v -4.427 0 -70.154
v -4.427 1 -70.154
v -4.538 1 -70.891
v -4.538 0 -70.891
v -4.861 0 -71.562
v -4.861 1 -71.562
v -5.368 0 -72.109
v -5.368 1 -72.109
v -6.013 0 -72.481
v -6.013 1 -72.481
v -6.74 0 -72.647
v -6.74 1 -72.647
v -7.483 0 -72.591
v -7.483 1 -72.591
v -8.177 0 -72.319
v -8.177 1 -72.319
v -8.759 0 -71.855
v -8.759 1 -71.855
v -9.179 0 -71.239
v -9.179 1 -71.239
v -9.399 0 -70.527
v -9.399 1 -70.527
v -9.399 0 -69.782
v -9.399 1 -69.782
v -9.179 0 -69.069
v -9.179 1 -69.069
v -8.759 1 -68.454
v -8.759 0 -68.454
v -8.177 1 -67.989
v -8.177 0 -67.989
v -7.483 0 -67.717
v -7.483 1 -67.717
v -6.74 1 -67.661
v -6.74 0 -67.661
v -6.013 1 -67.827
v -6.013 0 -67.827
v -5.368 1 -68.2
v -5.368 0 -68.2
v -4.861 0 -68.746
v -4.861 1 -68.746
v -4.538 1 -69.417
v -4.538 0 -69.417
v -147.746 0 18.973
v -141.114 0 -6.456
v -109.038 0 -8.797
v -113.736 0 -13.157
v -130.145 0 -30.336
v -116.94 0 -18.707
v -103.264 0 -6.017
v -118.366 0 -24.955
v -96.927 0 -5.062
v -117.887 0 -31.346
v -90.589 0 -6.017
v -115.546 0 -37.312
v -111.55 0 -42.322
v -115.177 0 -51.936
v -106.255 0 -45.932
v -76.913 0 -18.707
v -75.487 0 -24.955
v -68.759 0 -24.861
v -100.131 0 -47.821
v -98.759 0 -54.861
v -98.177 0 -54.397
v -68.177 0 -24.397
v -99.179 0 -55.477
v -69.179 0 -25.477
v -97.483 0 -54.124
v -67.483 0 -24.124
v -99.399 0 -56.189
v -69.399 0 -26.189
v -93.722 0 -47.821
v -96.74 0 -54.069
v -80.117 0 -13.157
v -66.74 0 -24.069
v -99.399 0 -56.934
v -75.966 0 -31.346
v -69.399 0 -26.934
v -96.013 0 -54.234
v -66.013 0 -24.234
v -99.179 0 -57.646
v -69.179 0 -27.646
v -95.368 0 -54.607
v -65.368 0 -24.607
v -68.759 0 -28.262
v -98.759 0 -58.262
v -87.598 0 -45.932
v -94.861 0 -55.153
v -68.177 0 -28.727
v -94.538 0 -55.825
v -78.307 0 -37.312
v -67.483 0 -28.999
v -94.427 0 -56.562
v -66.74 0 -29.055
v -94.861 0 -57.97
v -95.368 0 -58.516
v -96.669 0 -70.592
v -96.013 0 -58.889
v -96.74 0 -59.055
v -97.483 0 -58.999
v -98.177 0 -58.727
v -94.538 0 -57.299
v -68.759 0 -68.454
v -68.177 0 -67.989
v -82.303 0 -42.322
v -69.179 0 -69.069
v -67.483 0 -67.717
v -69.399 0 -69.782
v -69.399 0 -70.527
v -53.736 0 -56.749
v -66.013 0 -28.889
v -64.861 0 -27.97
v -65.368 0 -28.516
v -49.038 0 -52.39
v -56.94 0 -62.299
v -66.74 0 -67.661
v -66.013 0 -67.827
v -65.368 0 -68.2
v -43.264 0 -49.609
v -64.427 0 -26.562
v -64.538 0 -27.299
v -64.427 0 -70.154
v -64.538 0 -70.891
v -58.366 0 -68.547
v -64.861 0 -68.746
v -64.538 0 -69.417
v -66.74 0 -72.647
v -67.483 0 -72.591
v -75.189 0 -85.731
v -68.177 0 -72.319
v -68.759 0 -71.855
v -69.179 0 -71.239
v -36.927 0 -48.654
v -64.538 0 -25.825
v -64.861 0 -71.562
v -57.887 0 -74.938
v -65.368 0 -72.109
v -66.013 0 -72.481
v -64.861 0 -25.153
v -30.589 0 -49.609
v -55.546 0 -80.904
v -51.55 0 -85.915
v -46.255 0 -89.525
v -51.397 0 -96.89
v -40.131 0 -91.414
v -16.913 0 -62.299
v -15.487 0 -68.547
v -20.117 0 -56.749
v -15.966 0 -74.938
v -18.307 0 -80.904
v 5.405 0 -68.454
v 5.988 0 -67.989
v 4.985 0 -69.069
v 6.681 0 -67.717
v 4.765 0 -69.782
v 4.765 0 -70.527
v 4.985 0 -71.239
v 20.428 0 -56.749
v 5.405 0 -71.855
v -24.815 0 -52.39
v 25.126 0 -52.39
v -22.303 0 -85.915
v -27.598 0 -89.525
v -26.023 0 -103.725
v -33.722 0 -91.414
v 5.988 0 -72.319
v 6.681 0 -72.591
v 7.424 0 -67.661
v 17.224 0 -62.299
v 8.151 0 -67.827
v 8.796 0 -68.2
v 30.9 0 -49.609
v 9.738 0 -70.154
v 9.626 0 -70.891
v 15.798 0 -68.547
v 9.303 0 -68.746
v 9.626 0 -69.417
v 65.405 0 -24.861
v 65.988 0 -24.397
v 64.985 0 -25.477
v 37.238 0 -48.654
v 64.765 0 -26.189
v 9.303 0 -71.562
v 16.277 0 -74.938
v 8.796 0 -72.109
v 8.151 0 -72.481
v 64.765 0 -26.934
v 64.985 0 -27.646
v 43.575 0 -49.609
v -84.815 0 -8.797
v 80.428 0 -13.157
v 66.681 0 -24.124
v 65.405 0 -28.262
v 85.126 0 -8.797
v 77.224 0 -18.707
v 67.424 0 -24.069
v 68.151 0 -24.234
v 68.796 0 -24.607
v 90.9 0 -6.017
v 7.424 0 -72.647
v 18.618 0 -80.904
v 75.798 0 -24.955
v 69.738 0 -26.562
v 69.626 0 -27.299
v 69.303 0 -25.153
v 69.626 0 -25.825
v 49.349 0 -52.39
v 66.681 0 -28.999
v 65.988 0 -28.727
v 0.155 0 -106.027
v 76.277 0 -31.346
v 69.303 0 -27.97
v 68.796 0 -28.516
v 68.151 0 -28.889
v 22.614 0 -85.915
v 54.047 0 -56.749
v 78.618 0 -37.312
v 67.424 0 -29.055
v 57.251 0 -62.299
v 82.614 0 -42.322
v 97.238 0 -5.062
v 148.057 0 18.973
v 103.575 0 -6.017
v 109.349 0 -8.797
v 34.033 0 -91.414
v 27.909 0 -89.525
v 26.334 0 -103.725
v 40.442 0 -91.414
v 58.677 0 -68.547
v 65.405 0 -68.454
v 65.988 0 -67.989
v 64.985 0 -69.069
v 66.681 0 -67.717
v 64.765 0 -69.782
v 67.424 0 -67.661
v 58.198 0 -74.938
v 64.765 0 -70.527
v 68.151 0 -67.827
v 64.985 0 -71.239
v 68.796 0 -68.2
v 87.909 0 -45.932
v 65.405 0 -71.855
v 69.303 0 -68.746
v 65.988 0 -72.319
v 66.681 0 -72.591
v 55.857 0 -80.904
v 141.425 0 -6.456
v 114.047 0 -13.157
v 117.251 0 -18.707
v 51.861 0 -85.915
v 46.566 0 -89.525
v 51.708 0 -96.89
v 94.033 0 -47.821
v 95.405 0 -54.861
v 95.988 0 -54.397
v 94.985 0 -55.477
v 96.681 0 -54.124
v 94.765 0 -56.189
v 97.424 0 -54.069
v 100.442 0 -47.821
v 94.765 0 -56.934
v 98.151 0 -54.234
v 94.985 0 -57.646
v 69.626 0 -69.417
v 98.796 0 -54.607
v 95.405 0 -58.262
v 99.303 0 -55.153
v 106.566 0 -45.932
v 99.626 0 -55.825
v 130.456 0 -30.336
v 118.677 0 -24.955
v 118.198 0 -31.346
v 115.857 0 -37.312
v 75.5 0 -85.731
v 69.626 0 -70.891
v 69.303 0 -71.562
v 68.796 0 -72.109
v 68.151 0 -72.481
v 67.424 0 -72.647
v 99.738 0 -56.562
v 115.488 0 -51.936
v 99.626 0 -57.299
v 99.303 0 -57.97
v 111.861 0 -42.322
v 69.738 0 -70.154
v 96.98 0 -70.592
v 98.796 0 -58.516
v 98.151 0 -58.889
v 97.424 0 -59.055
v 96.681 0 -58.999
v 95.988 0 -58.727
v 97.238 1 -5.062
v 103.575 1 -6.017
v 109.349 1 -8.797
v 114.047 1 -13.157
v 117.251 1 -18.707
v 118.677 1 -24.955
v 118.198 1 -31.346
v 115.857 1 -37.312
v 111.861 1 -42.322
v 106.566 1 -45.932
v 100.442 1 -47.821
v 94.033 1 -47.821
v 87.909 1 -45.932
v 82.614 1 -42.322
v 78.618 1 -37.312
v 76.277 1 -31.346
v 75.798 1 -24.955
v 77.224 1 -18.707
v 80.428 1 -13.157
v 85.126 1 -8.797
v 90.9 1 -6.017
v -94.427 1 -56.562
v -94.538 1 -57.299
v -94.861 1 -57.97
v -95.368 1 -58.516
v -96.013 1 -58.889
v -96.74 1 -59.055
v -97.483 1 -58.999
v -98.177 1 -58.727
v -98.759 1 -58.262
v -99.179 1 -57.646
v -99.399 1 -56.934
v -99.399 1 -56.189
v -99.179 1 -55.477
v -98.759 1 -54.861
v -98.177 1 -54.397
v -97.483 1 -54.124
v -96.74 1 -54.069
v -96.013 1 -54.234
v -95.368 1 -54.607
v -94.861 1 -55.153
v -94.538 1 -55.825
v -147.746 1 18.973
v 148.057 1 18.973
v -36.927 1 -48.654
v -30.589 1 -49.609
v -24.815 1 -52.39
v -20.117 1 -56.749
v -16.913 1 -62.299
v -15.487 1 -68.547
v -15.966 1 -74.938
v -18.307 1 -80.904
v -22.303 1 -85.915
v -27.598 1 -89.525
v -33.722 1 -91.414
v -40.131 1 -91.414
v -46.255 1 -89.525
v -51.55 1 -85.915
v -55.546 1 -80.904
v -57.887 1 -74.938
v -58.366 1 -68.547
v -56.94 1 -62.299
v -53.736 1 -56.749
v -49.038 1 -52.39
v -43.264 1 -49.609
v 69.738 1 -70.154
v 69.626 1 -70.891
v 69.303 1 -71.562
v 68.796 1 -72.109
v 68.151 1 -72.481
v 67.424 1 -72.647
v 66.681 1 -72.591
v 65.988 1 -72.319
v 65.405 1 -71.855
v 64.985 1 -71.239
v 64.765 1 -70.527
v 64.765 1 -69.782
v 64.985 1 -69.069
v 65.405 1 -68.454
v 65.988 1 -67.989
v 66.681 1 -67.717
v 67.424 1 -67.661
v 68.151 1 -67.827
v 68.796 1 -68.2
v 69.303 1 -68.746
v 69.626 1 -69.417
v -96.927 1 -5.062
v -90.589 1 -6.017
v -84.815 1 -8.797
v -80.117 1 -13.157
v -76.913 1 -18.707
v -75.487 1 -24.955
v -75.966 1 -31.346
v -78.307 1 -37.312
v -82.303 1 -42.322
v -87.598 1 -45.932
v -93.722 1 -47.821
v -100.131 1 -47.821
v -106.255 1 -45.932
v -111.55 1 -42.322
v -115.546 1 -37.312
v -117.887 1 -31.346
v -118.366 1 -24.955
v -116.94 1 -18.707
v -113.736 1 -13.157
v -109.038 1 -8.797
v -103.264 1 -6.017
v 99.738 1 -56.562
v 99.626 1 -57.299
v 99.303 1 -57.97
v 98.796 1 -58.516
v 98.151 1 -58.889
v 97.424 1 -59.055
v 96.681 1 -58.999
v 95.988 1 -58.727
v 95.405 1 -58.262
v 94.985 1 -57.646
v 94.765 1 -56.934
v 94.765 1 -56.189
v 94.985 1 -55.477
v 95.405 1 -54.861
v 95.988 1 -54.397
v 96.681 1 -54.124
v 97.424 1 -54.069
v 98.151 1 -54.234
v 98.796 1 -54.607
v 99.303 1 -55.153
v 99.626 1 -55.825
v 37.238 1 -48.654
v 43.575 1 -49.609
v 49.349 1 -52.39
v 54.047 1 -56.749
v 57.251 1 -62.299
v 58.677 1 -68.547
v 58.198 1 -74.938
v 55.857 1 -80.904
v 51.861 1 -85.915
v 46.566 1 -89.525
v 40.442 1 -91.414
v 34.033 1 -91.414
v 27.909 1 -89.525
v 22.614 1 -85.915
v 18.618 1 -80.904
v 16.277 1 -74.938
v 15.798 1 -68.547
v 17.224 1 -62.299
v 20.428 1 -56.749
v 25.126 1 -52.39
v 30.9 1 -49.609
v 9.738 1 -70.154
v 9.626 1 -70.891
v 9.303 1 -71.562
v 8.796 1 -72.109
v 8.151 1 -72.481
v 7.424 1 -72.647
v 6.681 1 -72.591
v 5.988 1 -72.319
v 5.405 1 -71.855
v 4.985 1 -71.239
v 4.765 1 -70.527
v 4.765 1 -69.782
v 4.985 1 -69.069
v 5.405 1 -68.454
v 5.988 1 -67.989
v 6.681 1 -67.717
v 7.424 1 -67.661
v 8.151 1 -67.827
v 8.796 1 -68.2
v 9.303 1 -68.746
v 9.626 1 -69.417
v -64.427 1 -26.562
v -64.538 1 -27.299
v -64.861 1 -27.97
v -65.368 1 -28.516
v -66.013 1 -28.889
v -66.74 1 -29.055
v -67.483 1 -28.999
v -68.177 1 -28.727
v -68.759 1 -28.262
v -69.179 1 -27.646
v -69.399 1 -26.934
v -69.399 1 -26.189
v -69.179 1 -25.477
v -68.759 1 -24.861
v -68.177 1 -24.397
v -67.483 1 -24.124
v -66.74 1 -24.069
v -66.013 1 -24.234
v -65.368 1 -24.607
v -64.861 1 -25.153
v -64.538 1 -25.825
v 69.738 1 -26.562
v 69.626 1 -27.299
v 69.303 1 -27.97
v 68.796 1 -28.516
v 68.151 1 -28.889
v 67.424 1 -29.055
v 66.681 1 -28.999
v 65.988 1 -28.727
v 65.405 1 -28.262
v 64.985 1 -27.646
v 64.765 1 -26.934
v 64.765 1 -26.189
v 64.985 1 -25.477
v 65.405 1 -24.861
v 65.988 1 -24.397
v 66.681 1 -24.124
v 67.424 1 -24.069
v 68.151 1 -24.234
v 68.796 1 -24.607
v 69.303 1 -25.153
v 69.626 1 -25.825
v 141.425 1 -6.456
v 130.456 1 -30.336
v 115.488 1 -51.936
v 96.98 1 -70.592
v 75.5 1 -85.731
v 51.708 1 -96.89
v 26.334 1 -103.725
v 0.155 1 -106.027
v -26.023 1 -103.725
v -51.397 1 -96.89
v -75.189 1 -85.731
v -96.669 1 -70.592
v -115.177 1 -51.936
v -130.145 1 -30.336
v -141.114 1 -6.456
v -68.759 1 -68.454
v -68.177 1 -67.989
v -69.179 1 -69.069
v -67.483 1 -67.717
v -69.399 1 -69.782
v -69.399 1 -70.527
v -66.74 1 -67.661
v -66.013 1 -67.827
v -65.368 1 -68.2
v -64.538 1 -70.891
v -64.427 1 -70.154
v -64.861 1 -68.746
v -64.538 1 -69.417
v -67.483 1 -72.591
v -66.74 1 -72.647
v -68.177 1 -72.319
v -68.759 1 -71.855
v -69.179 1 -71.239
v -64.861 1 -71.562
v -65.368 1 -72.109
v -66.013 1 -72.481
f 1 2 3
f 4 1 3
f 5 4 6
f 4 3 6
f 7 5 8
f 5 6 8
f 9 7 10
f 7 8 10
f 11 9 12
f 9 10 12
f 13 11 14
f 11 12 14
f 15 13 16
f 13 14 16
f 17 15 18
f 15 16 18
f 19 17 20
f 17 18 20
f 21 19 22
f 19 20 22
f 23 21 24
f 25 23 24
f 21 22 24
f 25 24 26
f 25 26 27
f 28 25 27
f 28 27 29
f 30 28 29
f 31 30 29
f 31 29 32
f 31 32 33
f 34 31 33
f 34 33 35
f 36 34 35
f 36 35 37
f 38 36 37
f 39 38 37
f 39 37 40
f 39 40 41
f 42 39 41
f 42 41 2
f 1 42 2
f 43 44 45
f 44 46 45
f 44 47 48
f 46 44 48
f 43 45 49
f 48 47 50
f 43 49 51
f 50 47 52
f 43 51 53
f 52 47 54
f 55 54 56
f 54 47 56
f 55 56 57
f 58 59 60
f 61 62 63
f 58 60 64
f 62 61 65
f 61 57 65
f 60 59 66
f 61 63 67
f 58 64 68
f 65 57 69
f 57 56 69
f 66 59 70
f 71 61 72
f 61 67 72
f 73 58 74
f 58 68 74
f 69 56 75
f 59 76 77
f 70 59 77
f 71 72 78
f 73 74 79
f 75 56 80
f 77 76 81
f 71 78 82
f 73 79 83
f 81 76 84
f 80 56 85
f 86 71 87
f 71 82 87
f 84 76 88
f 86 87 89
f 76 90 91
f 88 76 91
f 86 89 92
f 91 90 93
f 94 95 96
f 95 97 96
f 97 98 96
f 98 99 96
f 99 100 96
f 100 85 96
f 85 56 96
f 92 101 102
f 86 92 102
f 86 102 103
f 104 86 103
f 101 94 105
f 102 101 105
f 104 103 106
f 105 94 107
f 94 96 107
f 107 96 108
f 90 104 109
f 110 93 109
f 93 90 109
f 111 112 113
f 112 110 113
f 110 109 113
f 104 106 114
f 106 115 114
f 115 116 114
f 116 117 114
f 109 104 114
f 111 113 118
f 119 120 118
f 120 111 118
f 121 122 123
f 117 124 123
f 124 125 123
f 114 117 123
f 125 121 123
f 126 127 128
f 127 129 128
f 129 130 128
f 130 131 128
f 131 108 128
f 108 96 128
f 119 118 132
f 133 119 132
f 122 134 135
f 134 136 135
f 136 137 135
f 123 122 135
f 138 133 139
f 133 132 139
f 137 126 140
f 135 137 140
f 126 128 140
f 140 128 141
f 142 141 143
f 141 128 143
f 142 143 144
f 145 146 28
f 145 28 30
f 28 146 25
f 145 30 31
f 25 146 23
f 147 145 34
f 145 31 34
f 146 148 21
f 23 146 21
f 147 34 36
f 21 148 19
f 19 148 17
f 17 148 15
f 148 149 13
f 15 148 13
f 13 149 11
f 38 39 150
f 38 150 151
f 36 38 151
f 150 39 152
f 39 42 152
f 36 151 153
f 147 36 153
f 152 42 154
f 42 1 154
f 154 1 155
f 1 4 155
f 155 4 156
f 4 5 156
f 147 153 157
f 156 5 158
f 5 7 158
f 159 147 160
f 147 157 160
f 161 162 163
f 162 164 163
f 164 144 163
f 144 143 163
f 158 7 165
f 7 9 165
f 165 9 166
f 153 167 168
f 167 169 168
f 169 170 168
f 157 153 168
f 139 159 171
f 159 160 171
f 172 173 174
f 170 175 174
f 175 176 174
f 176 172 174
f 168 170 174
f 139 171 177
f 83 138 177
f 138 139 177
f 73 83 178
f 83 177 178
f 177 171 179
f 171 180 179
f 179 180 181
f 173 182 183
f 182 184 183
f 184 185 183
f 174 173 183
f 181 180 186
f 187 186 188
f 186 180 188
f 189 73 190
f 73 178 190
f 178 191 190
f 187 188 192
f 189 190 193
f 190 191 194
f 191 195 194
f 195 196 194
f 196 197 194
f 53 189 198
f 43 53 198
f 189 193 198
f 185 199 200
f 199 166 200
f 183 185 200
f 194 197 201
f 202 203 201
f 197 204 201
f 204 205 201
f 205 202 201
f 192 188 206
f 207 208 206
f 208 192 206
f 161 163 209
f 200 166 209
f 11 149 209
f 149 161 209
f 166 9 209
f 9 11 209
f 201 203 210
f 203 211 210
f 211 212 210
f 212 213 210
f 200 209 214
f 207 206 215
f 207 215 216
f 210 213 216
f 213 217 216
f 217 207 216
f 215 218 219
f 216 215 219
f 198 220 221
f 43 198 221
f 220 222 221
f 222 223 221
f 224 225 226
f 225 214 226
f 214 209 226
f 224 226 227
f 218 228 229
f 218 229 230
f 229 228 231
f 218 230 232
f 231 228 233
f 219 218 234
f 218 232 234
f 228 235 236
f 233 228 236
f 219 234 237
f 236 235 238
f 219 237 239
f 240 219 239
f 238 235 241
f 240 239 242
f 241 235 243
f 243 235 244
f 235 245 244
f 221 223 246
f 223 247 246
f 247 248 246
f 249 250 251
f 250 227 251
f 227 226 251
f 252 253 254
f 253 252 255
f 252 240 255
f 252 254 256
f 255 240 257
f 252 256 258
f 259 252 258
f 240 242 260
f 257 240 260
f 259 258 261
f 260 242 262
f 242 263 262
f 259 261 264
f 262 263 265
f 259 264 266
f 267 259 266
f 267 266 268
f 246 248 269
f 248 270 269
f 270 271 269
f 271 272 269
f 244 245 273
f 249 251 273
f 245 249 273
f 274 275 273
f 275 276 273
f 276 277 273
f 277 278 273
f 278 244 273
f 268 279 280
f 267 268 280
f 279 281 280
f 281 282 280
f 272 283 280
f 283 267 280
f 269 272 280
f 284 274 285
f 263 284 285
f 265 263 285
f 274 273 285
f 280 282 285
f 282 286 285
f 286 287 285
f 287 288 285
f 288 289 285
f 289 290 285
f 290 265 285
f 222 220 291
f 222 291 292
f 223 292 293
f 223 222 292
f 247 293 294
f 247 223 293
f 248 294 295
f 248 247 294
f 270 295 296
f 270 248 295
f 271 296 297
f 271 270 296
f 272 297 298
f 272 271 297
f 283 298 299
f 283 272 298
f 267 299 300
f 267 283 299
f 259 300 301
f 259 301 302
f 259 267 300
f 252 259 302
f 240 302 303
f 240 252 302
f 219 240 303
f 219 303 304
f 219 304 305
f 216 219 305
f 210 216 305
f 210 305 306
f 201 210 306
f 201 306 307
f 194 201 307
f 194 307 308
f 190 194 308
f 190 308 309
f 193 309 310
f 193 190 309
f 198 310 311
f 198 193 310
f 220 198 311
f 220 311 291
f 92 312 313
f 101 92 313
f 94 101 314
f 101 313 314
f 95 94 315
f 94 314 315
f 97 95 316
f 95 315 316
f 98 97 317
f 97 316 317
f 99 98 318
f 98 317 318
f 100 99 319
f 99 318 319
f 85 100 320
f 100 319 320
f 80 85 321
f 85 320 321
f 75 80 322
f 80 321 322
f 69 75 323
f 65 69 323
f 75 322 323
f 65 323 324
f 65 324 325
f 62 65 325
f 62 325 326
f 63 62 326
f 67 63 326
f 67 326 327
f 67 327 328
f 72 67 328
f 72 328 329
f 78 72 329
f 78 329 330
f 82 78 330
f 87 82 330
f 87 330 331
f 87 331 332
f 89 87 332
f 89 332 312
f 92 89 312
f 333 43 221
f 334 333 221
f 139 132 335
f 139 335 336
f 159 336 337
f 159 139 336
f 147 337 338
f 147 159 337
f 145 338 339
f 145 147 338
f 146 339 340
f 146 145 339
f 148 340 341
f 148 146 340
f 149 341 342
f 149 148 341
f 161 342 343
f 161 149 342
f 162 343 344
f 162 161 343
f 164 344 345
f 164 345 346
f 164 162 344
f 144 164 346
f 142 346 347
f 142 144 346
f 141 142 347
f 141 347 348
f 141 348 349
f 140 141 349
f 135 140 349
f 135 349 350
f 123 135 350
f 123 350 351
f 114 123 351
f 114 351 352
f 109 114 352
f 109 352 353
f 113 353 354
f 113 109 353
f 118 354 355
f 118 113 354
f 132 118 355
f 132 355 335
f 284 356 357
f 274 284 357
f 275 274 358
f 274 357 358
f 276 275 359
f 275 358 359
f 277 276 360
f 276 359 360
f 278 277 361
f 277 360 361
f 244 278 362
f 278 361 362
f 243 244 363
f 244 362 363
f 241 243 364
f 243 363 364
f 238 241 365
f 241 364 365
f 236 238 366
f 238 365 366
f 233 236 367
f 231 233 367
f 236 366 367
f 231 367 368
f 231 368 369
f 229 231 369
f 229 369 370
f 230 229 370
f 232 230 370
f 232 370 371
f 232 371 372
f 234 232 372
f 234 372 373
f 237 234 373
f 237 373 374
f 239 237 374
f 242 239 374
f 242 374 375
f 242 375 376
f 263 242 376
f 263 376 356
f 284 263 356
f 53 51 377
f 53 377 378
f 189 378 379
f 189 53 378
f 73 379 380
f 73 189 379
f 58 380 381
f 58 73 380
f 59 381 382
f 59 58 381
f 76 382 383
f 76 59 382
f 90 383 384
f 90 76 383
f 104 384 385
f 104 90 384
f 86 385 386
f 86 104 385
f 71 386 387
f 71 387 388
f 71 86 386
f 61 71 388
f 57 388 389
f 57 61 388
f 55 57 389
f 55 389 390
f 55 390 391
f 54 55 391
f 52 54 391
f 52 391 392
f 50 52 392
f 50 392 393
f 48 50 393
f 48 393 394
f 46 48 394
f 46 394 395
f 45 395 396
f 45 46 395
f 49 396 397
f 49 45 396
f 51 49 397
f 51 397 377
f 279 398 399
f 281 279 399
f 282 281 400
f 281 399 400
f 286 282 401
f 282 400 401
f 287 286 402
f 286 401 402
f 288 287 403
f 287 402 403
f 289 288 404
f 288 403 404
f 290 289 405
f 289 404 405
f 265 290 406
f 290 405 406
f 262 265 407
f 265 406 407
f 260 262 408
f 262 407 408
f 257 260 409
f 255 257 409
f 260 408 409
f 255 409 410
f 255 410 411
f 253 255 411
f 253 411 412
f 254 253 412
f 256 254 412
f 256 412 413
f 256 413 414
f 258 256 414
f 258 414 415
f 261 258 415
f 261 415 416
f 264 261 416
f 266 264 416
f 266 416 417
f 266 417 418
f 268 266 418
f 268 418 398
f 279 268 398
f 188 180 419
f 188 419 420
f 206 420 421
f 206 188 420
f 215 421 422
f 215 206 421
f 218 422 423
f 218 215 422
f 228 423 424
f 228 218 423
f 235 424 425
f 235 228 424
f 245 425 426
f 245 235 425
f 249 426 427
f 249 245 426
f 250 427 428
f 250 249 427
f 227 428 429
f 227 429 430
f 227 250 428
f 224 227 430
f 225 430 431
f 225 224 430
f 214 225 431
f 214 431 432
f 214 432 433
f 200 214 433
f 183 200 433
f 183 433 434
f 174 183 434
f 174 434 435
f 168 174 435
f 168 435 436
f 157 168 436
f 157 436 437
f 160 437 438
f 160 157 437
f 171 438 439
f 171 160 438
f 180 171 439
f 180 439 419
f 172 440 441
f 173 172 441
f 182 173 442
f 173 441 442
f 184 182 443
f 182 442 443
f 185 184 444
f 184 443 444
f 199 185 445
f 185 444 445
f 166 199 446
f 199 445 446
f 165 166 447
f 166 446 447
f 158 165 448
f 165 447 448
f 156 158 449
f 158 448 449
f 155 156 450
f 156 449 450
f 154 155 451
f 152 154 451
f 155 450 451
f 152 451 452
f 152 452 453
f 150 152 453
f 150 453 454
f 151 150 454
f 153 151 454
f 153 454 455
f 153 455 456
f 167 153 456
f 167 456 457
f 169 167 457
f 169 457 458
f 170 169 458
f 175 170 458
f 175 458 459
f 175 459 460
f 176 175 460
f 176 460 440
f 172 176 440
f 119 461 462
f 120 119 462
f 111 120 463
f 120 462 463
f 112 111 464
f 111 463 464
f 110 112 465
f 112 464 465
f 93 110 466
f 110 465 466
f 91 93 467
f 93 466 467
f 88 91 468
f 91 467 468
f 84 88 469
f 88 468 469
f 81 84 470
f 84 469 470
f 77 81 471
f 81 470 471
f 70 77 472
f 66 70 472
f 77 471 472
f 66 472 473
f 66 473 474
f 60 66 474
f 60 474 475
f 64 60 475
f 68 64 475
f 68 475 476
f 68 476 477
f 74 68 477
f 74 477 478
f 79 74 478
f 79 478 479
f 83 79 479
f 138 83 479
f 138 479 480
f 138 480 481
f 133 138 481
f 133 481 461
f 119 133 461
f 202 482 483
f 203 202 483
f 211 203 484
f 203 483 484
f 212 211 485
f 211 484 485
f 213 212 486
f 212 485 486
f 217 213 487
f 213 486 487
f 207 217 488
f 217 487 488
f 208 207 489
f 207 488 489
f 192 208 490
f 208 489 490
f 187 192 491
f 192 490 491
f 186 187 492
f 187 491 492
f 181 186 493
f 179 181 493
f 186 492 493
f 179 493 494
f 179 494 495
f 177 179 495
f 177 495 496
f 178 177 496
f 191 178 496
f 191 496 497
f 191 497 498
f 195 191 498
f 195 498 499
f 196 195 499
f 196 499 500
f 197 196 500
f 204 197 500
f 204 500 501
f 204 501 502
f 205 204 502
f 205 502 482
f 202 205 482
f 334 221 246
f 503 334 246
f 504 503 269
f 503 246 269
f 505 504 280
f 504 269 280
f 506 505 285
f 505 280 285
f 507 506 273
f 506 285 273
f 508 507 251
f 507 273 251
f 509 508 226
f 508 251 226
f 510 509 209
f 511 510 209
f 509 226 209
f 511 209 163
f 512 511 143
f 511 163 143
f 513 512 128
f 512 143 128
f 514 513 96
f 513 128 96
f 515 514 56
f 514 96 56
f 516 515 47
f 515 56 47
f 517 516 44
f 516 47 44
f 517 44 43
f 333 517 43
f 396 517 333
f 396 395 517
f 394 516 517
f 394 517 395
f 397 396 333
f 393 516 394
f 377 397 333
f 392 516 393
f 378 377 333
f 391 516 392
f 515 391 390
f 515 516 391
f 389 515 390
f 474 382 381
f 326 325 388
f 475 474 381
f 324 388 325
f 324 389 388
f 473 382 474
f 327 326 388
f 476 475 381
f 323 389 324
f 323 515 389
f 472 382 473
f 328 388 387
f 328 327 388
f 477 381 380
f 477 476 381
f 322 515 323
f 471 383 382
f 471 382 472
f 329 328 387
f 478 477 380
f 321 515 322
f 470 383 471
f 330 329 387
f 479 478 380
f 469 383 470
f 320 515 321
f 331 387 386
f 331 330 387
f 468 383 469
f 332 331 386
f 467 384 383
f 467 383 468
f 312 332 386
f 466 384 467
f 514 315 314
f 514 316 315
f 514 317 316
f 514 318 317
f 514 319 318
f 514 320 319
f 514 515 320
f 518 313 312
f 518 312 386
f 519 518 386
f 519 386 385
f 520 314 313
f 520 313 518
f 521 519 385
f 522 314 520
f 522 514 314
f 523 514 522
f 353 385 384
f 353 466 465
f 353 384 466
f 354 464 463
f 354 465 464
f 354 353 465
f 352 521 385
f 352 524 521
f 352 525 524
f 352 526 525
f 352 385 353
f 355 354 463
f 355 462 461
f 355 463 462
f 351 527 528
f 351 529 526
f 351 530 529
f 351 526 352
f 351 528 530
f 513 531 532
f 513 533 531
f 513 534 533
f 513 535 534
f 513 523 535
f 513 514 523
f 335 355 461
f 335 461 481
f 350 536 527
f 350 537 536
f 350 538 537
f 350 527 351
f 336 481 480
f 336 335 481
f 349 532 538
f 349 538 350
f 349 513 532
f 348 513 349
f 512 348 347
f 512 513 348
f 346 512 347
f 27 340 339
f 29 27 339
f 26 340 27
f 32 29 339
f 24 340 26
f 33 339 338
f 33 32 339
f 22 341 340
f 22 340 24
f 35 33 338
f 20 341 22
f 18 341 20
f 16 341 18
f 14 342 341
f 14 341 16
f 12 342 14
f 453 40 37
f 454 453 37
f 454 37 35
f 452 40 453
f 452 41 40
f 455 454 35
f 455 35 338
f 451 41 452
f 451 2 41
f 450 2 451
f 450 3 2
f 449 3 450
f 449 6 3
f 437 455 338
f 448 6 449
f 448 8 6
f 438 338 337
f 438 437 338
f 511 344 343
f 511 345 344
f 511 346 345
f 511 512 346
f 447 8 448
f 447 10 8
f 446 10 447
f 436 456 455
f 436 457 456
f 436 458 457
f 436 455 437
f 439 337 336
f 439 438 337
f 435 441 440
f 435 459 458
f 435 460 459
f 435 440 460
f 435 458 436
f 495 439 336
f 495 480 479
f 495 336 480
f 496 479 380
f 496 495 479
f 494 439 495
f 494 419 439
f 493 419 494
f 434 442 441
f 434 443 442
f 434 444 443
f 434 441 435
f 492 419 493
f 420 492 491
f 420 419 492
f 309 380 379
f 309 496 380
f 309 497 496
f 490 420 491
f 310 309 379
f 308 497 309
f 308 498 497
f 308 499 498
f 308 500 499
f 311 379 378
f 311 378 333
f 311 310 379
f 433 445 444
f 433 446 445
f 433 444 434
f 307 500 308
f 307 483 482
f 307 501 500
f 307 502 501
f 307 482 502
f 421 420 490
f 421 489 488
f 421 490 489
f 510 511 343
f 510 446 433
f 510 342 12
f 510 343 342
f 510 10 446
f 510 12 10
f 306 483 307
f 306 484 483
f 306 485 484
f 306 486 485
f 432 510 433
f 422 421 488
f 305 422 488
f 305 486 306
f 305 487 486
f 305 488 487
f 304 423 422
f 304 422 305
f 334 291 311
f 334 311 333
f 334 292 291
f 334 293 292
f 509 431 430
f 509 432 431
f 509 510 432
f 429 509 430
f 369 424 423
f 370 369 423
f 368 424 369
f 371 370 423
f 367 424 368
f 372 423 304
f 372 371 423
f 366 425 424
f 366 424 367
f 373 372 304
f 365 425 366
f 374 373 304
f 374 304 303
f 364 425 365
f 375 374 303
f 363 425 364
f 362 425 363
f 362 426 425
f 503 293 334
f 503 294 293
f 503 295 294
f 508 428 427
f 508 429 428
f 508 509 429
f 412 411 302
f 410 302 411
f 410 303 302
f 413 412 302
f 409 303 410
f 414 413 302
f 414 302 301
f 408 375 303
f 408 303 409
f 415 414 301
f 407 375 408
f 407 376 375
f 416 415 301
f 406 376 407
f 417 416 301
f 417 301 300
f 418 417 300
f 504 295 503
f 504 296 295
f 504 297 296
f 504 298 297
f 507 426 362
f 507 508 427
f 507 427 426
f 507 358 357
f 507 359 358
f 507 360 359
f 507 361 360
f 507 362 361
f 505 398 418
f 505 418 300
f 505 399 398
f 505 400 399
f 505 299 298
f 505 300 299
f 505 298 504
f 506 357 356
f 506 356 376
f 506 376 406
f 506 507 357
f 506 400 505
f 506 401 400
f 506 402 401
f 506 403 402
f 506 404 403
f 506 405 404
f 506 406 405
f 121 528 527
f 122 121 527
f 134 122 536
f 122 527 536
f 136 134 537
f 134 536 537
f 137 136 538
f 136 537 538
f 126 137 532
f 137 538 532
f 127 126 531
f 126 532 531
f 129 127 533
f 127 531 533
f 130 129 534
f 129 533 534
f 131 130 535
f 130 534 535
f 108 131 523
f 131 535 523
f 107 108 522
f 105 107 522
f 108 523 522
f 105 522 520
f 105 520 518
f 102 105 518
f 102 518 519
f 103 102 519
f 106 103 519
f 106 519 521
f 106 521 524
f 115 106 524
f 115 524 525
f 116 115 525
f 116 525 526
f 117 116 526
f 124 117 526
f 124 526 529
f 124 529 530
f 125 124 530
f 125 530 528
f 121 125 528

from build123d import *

# Parameters (mm, degrees)
SKETCH3_R             = 21.5
BOSS_EXTRUDE3_DEPTH   = 1
F_5_0MM_DOWEL_HOLE1_D = 5


with BuildPart() as part:
    # Sketch3 → Boss-Extrude3 (new body)
    with BuildSketch(Plane(origin=(0, 0, 0), x_dir=(1, 0, 0), z_dir=(0, 1, 0))):
        with BuildLine():
            Line((-147.74649939, -18.972612677), (148.057489765, -18.972612677))
            ThreePointArc((148.057489765, -18.972612677), (0.155495187, 106.027387323), (-147.74649939, -18.972612677))
        make_face()
        with Locations(Location((-96.926544138, 26.561617598, 0), (0, 0, 270))):
            Circle(SKETCH3_R, mode=Mode.SUBTRACT)
        with Locations(Location((97.237534512, 26.561617598, 0), (0, 0, 270))):
            Circle(SKETCH3_R, mode=Mode.SUBTRACT)
        with Locations(Location((-36.926544138, 70.154169278, 0), (0, 0, 270))):
            Circle(SKETCH3_R, mode=Mode.SUBTRACT)
        with Locations(Location((37.237534512, 70.154169278, 0), (0, 0, 270))):
            Circle(SKETCH3_R, mode=Mode.SUBTRACT)
    extrude(amount=BOSS_EXTRUDE3_DEPTH)

    # Ø5.0mm Dowel Hole1 (through all)
    with Locations(Plane(origin=(0, 0, 0), x_dir=(-1, 0, 0), z_dir=(0, -1, 0))):
        with Locations((-97.237534512, 56.561617598), (-67.237534512, 26.561617598), (-67.237534512, 70.154169278), (-7.237534512, 70.154169278), (6.926544138, 70.154169278), (66.926544138, 70.154169278), (96.926544138, 56.561617598), (66.926544138, 26.561617598)):
            Hole(F_5_0MM_DOWEL_HOLE1_D / 2)


solid = part.part
